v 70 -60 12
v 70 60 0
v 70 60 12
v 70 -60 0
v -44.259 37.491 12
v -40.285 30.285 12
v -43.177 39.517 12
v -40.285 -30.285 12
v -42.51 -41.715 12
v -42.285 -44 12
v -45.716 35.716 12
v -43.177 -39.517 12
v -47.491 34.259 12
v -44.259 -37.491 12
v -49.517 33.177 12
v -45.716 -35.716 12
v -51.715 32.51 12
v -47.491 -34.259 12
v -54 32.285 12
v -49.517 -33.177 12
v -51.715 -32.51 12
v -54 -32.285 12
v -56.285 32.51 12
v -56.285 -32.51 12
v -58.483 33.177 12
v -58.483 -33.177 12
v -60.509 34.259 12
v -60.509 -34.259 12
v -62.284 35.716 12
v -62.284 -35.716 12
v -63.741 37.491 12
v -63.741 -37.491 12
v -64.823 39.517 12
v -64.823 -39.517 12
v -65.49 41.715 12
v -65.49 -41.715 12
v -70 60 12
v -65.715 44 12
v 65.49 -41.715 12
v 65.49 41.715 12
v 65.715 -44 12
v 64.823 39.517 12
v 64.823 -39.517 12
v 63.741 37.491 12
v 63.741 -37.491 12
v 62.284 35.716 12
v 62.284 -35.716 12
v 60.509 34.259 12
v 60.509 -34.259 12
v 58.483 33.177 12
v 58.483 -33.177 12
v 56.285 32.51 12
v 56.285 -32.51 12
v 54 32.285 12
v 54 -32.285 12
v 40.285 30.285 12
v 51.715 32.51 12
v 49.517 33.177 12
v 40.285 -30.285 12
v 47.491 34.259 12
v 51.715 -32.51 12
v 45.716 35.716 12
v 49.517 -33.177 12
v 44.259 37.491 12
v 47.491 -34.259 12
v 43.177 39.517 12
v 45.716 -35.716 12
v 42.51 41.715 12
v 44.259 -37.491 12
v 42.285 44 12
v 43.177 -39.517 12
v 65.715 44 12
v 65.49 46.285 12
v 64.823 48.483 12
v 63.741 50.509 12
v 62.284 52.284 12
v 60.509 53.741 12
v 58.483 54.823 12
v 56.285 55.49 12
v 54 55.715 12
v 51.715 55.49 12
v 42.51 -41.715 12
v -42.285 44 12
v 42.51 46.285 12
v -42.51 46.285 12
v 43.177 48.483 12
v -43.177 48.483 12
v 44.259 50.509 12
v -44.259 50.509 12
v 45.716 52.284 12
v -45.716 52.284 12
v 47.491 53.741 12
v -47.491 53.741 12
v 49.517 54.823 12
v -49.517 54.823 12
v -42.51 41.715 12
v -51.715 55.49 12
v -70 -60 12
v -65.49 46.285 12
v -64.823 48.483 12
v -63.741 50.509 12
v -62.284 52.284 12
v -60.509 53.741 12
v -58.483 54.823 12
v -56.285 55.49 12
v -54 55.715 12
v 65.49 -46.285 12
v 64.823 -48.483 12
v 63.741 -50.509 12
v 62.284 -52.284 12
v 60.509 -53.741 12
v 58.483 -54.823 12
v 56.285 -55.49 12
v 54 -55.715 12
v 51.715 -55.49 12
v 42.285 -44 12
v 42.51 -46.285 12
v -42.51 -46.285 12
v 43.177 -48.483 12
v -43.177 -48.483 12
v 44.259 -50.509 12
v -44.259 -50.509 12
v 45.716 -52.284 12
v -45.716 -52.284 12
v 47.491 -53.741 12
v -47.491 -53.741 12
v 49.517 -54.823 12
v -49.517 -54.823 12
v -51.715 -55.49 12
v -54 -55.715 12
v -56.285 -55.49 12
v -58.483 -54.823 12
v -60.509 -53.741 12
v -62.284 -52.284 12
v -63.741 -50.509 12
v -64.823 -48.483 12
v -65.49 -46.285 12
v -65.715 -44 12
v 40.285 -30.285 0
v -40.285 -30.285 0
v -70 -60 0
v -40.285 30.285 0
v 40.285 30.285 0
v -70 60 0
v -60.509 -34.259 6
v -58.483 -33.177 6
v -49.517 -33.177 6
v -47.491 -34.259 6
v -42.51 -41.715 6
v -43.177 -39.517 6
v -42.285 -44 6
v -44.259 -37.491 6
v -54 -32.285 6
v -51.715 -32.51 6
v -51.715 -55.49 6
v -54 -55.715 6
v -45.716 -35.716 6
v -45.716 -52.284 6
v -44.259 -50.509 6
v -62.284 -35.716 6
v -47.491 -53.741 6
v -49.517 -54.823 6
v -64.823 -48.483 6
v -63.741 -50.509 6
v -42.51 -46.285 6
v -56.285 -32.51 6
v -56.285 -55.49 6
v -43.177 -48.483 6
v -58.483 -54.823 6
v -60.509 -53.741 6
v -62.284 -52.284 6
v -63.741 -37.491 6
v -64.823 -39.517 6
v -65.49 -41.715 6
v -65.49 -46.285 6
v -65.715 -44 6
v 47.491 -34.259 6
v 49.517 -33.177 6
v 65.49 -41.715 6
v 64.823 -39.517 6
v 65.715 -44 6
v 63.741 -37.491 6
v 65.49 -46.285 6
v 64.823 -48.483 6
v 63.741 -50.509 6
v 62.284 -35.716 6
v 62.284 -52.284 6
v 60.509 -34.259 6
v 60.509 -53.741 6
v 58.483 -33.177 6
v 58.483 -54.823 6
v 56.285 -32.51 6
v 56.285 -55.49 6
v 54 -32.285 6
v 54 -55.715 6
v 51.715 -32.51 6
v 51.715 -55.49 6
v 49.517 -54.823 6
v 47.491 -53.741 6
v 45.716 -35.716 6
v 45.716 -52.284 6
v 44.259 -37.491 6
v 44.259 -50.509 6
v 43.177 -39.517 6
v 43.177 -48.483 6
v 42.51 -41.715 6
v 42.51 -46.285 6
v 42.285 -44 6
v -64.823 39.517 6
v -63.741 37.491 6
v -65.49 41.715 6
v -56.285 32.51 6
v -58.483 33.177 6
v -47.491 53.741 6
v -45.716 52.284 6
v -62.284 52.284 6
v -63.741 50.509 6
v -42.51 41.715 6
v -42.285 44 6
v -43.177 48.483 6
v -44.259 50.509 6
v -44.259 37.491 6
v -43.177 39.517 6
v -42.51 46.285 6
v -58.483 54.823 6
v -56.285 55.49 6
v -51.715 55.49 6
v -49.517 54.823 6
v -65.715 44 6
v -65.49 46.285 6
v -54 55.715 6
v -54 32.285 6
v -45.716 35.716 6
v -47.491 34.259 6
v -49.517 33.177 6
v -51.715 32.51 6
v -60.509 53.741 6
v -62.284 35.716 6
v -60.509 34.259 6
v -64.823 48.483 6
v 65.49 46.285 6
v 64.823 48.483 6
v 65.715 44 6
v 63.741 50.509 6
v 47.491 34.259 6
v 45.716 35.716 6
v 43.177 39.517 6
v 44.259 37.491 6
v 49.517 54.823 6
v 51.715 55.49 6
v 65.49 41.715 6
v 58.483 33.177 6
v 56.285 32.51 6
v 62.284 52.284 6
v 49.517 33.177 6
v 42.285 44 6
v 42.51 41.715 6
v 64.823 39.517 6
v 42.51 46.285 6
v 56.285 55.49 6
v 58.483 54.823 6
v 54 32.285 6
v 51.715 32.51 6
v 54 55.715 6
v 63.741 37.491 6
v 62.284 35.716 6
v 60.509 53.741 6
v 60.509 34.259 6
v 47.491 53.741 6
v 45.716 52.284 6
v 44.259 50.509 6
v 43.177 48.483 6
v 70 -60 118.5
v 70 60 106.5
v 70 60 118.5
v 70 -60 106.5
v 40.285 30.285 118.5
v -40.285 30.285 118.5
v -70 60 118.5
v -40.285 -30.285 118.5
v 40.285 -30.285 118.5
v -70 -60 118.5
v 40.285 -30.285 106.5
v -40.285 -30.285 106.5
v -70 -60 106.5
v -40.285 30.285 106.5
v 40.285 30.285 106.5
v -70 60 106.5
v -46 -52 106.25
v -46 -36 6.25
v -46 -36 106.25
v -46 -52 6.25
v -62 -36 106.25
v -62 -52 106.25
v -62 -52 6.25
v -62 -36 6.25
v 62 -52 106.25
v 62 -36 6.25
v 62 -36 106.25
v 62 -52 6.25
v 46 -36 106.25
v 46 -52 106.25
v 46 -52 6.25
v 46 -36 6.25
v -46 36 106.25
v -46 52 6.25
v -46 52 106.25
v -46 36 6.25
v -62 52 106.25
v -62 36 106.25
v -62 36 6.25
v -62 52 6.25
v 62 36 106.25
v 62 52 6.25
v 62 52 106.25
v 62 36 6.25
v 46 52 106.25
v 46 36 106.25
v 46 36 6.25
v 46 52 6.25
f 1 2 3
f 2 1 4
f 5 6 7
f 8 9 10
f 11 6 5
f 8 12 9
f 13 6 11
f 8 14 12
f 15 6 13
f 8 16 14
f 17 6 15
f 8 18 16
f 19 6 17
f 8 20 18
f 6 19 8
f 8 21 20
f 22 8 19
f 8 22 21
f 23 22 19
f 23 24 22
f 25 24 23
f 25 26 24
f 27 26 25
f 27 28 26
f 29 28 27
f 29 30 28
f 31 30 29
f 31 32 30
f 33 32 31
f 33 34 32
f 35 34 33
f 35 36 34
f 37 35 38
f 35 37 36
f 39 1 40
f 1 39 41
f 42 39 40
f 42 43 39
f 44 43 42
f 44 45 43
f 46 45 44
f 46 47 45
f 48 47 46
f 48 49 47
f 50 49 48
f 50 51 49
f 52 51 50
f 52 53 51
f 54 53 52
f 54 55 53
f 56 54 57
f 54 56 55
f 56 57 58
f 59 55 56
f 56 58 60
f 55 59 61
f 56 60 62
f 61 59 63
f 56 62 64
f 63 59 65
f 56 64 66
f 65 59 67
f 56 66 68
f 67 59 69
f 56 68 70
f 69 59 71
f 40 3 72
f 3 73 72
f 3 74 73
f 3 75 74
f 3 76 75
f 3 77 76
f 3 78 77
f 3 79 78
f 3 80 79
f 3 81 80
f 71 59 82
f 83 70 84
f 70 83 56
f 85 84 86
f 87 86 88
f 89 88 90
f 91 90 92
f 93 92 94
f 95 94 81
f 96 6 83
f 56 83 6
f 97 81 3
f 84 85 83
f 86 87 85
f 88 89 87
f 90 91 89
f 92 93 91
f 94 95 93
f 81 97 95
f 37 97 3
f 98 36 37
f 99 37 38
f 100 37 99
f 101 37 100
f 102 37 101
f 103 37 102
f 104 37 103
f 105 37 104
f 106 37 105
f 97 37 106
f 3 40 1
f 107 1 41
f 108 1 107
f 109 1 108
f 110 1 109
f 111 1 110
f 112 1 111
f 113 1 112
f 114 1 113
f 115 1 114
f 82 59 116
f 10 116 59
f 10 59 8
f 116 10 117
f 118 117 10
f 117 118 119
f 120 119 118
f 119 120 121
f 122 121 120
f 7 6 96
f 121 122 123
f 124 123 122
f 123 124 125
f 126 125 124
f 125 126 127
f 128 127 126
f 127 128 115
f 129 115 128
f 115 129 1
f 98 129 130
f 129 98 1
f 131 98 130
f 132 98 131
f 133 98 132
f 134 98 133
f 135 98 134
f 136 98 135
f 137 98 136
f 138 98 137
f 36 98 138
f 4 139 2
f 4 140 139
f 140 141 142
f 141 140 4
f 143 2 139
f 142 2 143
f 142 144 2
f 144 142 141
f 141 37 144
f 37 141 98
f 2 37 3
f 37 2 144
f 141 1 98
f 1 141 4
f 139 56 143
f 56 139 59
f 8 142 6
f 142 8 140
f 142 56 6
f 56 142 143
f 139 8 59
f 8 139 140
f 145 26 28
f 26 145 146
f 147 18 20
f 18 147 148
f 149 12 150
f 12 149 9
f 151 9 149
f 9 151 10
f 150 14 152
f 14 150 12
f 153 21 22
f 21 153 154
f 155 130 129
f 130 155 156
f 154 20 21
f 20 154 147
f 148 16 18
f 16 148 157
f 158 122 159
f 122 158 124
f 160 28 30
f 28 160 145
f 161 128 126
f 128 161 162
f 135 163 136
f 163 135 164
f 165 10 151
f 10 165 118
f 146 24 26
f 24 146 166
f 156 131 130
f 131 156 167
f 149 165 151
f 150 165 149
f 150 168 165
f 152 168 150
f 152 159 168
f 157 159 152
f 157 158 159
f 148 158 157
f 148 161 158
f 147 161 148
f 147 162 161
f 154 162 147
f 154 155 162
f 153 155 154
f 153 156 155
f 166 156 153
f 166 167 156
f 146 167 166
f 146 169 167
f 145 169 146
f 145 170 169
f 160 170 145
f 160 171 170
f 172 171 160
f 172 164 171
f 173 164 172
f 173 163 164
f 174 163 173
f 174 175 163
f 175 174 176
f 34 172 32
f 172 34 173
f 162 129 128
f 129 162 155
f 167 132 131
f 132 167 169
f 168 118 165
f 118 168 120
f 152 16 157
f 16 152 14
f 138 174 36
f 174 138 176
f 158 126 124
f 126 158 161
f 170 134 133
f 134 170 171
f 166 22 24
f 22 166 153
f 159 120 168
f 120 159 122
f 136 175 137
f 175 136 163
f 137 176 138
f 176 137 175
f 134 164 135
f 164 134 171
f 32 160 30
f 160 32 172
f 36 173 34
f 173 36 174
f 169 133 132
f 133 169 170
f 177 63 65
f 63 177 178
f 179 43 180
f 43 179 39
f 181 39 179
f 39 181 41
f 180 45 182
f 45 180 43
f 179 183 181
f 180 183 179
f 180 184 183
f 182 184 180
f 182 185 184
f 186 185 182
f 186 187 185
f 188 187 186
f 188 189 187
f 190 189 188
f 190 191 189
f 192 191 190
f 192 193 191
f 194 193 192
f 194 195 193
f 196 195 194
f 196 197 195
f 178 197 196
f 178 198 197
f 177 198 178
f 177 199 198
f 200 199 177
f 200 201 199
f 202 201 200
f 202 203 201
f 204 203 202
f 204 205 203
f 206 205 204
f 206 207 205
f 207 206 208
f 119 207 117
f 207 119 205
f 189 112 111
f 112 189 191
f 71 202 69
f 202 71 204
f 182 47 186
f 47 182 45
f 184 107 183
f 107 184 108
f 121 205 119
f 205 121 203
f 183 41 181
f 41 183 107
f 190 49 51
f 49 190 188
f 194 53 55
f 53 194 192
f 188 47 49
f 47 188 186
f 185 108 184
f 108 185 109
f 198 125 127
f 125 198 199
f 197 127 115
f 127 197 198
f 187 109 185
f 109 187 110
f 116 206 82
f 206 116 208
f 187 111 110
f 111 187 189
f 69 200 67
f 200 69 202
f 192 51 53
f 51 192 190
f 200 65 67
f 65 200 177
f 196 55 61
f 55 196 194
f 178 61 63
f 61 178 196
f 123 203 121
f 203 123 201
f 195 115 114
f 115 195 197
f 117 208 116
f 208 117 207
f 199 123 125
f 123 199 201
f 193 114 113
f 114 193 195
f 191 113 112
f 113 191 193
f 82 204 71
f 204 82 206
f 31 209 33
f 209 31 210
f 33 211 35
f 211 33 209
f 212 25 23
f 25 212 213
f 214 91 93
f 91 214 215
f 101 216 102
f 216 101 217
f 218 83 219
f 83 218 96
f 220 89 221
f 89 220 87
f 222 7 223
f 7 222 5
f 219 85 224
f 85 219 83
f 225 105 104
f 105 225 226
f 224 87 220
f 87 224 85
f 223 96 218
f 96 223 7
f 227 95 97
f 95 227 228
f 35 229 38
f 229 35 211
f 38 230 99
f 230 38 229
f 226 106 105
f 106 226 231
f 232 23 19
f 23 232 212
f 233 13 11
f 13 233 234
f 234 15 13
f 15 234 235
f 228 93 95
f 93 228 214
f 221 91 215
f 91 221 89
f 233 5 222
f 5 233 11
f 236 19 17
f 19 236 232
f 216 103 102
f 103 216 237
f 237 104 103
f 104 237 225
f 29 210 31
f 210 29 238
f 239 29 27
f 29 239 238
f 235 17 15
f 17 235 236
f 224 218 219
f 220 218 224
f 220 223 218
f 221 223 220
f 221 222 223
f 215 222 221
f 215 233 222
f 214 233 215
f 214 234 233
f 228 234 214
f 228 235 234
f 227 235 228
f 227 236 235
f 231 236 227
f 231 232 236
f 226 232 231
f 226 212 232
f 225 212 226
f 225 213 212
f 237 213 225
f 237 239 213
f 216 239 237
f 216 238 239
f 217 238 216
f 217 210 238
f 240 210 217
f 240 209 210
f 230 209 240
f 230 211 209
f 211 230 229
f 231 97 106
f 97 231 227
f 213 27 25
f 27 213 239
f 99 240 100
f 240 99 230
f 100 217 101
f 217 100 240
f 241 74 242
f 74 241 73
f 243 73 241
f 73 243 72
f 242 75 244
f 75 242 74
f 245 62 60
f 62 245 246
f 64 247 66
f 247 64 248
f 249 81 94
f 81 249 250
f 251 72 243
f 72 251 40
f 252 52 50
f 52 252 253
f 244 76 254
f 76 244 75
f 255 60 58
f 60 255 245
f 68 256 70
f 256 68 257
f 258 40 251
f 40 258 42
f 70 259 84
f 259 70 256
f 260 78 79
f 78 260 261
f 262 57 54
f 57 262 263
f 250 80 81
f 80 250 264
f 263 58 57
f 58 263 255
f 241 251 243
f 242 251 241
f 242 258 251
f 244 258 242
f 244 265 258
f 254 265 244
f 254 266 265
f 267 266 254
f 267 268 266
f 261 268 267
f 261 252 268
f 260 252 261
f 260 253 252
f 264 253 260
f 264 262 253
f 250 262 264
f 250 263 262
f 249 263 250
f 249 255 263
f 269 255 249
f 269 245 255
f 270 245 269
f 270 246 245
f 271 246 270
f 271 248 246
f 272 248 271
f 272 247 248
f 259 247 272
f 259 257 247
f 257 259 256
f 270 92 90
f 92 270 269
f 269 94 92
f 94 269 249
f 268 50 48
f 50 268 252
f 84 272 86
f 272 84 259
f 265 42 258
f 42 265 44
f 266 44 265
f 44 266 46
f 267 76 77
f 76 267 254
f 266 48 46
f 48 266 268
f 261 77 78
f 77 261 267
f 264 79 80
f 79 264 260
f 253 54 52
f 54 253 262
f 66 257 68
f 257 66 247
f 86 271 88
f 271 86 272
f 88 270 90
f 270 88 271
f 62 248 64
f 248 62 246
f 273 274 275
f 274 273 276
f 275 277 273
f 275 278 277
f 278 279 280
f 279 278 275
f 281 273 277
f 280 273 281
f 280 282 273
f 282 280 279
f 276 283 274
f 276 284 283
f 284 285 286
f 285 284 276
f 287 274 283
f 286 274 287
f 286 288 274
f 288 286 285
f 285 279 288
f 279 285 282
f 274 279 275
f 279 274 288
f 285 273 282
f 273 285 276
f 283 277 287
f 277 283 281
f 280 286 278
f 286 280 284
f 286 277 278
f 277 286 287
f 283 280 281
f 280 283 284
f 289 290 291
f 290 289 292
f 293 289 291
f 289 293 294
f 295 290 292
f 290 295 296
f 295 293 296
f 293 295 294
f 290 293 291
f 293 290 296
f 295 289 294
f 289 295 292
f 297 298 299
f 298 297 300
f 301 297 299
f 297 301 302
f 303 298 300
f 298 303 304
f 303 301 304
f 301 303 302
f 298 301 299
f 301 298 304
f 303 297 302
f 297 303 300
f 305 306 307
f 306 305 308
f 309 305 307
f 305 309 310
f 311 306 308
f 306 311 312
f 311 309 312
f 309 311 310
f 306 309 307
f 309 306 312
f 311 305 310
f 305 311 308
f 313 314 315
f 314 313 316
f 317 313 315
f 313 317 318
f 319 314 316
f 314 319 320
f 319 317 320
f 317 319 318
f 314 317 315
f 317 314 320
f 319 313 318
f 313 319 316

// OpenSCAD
$fn = 32;

// ------------------------------------------------------------------------
// Frame cube: base 140 x 120 mm, posts 100 mm tall
// Every part is its own module, assembly() places every instance.
// ------------------------------------------------------------------------

// --- part 1 ---
module base_frame() {
  difference() {
    translate([-70, -60, 0]) cube([140, 120, 12]);
    translate([-40.285, -30.285, -1]) cube([80.57, 60.57, 14]);
    translate([-54, -44, 6]) cylinder(h = 7, d = 23.43);
    translate([54, -44, 6]) cylinder(h = 7, d = 23.43);
    translate([-54, 44, 6]) cylinder(h = 7, d = 23.43);
    translate([54, 44, 6]) cylinder(h = 7, d = 23.43);
  }
}

// --- part 2 ---
module corner_post() {
  translate([-8, -8, 0]) cube([16, 16, 100]);
}

// --- part 3 ---
module top_frame() {
  difference() {
    translate([-70, -60, 0]) cube([140, 120, 12]);
    translate([-40.285, -30.285, -1]) cube([80.57, 60.57, 14]);
  }
}

// --- assembly ---
module assembly() {
  color([0.80, 0.24, 0.20]) translate([0, 0, 0]) rotate([0, 0, 0]) base_frame();
  color([0.20, 0.45, 0.75]) translate([-54, -44, 6.25]) rotate([0, 0, 0]) corner_post();
  color([0.25, 0.62, 0.32]) translate([54, -44, 6.25]) rotate([0, 0, 0]) corner_post();
  color([0.92, 0.70, 0.18]) translate([-54, 44, 6.25]) rotate([0, 0, 0]) corner_post();
  color([0.58, 0.35, 0.70]) translate([54, 44, 6.25]) rotate([0, 0, 0]) corner_post();
  color([0.16, 0.66, 0.66]) translate([0, 0, 106.5]) rotate([0, 0, 0]) top_frame();
}

assembly();
